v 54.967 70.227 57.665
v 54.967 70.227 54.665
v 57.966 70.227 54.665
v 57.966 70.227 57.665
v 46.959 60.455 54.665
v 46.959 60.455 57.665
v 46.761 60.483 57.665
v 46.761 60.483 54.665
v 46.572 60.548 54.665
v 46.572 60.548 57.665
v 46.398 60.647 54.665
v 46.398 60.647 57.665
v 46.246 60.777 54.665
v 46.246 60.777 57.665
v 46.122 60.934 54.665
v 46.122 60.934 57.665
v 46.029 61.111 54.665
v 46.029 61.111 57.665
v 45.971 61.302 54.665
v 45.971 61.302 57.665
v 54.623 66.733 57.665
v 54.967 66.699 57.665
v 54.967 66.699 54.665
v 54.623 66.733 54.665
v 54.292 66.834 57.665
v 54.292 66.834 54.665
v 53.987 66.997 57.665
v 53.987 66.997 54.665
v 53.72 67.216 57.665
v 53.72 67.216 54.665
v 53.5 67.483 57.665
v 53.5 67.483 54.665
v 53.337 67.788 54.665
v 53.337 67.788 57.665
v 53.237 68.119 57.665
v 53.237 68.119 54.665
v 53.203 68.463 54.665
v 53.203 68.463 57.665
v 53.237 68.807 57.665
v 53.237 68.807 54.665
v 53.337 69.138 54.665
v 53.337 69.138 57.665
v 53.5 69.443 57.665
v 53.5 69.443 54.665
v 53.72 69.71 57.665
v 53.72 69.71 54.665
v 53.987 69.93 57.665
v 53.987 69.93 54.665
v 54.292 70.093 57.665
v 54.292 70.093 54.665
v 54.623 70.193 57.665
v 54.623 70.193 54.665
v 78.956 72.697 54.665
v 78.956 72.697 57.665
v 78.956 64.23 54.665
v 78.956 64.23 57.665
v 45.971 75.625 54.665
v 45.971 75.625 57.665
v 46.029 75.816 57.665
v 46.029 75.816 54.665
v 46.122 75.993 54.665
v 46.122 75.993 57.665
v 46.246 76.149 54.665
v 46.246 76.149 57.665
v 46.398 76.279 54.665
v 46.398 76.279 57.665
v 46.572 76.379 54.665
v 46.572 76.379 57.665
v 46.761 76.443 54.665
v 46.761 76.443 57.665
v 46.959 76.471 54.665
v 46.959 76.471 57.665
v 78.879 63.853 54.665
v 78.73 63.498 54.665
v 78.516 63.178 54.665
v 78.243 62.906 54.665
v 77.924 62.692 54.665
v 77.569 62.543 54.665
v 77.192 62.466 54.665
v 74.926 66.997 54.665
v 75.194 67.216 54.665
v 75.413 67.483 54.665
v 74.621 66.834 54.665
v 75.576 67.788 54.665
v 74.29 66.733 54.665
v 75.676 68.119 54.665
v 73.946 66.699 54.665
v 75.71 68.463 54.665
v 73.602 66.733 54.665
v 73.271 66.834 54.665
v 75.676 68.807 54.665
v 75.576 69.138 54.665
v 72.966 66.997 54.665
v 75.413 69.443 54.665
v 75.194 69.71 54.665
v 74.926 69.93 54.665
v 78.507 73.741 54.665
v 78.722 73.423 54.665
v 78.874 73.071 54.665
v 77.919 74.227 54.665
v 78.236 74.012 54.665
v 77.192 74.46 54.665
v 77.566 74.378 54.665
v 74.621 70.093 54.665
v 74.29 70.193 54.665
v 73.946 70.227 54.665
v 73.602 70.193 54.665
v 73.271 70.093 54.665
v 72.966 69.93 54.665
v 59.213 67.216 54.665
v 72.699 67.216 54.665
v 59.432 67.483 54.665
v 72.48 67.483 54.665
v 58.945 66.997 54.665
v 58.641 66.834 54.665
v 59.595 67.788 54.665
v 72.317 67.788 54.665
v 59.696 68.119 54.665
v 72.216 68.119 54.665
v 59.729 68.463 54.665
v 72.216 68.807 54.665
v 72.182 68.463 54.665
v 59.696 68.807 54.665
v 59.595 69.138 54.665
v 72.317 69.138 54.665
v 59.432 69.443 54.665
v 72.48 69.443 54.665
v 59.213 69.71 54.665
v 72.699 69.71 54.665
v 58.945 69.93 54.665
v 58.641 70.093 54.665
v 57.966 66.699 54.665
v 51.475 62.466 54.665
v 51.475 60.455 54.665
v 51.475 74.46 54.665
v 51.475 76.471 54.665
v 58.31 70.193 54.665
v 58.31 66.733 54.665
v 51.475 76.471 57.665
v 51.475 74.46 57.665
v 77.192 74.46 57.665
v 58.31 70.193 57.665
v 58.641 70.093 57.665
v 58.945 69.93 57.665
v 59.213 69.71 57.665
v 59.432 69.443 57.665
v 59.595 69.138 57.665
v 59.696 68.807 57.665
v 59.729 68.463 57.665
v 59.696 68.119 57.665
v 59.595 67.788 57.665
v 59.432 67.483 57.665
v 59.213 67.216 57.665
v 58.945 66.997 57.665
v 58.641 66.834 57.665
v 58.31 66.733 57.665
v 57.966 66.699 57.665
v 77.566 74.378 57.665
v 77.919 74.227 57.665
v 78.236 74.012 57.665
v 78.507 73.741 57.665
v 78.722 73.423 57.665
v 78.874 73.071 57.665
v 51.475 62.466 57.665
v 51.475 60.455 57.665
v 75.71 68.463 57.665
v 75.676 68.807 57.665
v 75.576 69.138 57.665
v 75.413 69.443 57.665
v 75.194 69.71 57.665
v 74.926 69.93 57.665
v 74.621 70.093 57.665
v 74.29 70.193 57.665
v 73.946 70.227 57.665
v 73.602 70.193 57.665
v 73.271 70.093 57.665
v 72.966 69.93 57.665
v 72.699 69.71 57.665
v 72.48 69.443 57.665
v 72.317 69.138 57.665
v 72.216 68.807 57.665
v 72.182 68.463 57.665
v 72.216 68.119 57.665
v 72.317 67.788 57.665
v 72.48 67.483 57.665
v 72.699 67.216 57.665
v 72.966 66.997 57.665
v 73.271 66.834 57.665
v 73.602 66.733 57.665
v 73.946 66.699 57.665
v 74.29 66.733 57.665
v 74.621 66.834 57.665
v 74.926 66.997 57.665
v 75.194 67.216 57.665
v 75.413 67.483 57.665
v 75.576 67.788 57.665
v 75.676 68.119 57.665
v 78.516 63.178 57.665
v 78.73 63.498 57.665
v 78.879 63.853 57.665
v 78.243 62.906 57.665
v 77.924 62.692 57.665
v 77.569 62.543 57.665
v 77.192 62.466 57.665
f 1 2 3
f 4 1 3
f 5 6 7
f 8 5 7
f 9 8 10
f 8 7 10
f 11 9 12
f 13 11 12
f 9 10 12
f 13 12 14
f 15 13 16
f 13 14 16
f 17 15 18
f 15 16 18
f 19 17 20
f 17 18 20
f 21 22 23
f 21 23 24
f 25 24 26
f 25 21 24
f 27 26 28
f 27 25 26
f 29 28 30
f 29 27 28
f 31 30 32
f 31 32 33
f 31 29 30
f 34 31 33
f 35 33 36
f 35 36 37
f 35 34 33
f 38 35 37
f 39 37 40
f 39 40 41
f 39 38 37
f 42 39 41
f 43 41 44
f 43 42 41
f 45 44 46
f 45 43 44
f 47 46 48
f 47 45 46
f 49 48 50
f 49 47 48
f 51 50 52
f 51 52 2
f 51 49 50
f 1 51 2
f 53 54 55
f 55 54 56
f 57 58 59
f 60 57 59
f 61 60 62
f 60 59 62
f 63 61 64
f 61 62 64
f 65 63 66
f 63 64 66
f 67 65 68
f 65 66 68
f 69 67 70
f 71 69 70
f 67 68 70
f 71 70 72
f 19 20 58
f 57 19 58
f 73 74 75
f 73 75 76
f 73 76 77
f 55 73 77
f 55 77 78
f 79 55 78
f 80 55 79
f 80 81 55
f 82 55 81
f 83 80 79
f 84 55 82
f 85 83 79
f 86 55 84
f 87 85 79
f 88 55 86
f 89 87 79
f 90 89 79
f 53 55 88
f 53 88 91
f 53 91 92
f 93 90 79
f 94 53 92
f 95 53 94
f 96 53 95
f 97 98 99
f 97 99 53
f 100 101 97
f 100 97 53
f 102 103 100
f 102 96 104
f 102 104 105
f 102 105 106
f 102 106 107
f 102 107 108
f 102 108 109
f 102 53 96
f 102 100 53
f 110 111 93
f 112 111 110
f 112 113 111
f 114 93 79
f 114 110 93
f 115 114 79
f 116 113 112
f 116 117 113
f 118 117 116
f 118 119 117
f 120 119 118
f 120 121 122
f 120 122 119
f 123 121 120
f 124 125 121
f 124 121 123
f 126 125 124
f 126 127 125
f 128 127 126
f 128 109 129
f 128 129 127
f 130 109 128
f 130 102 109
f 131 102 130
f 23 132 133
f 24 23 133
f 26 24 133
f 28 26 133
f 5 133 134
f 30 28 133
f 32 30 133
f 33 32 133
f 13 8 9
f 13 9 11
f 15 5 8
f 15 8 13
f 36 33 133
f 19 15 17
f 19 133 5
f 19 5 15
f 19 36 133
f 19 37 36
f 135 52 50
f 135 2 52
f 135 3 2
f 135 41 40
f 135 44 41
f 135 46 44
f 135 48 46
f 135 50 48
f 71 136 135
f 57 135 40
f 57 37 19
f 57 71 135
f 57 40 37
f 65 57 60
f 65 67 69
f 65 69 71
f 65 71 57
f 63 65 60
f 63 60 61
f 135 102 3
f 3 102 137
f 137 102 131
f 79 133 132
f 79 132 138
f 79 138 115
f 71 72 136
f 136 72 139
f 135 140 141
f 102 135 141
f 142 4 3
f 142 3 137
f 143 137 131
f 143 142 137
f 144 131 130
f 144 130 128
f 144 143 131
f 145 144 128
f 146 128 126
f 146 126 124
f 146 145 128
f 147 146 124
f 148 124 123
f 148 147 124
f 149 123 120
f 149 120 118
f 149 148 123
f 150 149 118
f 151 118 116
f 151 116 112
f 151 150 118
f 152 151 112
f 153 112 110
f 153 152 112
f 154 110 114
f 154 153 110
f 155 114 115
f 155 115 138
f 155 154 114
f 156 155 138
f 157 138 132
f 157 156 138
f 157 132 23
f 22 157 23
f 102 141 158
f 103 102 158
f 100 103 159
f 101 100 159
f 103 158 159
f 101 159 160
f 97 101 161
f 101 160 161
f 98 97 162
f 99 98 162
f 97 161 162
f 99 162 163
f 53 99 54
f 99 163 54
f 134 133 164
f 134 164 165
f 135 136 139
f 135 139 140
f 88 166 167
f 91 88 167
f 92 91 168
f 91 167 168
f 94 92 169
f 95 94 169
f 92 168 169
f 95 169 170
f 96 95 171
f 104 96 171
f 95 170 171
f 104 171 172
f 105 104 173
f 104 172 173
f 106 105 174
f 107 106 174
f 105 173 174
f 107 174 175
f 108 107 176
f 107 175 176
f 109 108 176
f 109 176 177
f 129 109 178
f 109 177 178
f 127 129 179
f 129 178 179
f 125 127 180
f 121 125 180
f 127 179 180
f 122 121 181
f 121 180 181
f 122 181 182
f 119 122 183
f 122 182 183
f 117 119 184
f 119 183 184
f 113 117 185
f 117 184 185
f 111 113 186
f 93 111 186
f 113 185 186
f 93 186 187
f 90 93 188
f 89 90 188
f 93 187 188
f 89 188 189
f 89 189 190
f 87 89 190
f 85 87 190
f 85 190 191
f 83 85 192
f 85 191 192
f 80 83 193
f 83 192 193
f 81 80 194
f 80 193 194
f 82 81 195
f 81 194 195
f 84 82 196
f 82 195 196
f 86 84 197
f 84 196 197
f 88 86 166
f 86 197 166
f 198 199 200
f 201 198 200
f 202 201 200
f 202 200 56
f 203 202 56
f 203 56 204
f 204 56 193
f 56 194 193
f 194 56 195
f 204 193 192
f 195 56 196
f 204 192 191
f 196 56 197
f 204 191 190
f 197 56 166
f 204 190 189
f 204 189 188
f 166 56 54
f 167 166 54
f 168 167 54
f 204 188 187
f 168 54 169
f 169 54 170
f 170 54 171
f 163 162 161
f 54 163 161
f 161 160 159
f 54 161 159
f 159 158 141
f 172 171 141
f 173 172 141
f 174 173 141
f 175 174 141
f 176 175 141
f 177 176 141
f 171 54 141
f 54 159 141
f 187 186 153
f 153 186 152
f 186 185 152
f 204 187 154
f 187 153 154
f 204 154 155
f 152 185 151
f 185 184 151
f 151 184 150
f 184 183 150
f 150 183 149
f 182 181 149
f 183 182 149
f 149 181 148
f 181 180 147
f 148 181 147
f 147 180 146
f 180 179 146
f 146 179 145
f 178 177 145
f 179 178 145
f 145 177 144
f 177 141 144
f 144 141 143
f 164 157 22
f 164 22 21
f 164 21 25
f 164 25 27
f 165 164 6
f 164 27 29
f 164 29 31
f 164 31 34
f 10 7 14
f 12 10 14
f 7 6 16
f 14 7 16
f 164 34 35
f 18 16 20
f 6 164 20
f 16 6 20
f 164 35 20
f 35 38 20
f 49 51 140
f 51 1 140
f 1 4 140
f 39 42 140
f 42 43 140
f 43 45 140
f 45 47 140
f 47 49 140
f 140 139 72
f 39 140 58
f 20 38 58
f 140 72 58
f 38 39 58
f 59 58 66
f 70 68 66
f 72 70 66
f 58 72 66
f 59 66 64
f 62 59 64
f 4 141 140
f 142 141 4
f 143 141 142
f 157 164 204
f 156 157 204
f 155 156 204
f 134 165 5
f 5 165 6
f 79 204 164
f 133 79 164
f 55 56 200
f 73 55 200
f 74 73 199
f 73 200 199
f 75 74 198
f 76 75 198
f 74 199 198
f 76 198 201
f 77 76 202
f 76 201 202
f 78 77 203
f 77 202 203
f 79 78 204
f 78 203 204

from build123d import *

# Parameters (mm, degrees)
ROBOTCHASSIS1_START = 54.665073828
ROBOTCHASSIS1_DEPTH = 3.000000026
SKETCH1_R           = 1.763889566
BOSS_EXTRUDE2_DEPTH = 3.000000026


# Read off the part's stored shape, not the designer's step: RobotChassis1
with BuildPart() as part:
    # RobotChassis1 outline → RobotChassis1 (new body)
    with BuildSketch(Plane.XY.offset(ROBOTCHASSIS1_START)):
        Polygon((78.391484289, 73.860644449), (78.215099244, 74.037033219), (78.038699298, 74.142797936), (77.826834588, 74.248562653), (77.615297704, 74.354670097), (77.403775721, 74.424951424), (77.191881209, 74.460434814), (51.474607854, 74.460434814), (51.474607854, 76.471339066), (46.958781152, 76.471339066), (46.782381206, 76.435855676), (46.605996161, 76.400715013), (46.46509078, 76.330094684), (46.323842673, 76.224326242), (46.182937293, 76.118561525), (46.11232069, 75.977313419), (46.006552248, 75.800920923), (45.971072583, 75.624535878), (45.971072583, 61.301893641), (46.006552248, 61.125501145), (46.11232069, 60.9491161), (46.182937293, 60.807867993), (46.323842673, 60.702103276), (46.46509078, 60.59633856), (46.605996161, 60.525714506), (46.782381206, 60.490231116), (46.958781152, 60.455090453), (51.474607854, 60.455090453), (51.474607854, 62.46599098), (77.191881209, 62.46599098), (77.403775721, 62.501131643), (77.826834588, 62.64237975), (78.038699298, 62.78328513), (78.215099244, 62.889392574), (78.391484289, 63.030297954), (78.53238967, 63.206686725), (78.673637776, 63.383075495), (78.779391317, 63.594947655), (78.920654326, 64.018006523), (78.955791264, 64.229882408), (78.955791264, 72.69654711), (78.920654326, 72.908076544), (78.850022822, 73.119948704), (78.779391317, 73.331478138), (78.673637776, 73.507866908), (78.53238967, 73.719396342), align=None)
        Polygon((58.177388578, 70.19161721), (58.388910561, 70.156476547), (58.600447445, 70.085852493), (58.77683249, 70.01522844), (58.953217535, 69.909463723), (59.12960258, 69.768562068), (59.270850687, 69.627310236), (59.412098794, 69.45091774), (59.517867236, 69.274532695), (59.58849874, 69.063003261), (59.658772616, 68.886614491), (59.694252281, 68.67474233), (59.729404121, 68.463212897), (59.694252281, 68.251340736), (59.658772616, 68.039811303), (59.58849874, 67.828281869), (59.517867236, 67.651893098), (59.412098794, 67.475504328), (59.270850687, 67.299111832), (59.12960258, 67.157867451), (58.953217535, 67.016619344), (58.77683249, 66.910854627), (58.600447445, 66.840230574), (58.388910561, 66.769949247), (58.177388578, 66.734465857), (57.965508967, 66.699325193), (54.966903596, 66.699325193), (54.755366712, 66.734465857), (54.543502002, 66.769949247), (54.331965118, 66.840230574), (54.155580072, 66.910854627), (53.979195027, 67.016619344), (53.802795081, 67.157867451), (53.661546974, 67.299111832), (53.520641594, 67.475504328), (53.414873152, 67.651893098), (53.344256549, 67.828281869), (53.273639946, 68.039811303), (53.238488107, 68.251340736), (53.203008442, 68.463212897), (53.238488107, 68.67474233), (53.273639946, 68.886614491), (53.344256549, 69.063003261), (53.414873152, 69.274532695), (53.520641594, 69.45091774), (53.661546974, 69.627310236), (53.802795081, 69.768562068), (53.979195027, 69.909463723), (54.155580072, 70.01522844), (54.331965118, 70.085852493), (54.543502002, 70.156476547), (54.755366712, 70.19161721), (54.966903596, 70.227104325), (57.965508967, 70.227104325), align=None, mode=Mode.SUBTRACT)
        Polygon((74.581555395, 70.085852493), (74.79309228, 70.01522844), (74.969462423, 69.909463723), (75.11071053, 69.768562068), (75.287110477, 69.627310236), (75.49863246, 69.274532695), (75.604400902, 69.063003261), (75.675017505, 68.886614491), (75.710169344, 68.67474233), (75.710169344, 68.251340736), (75.675017505, 68.039811303), (75.604400902, 67.828281869), (75.287110477, 67.299111832), (75.11071053, 67.157867451), (74.969462423, 67.016619344), (74.79309228, 66.910854627), (74.581555395, 66.840230574), (74.369675784, 66.769949247), (74.158153801, 66.734465857), (73.94627419, 66.699325193), (73.769889145, 66.734465857), (73.558352261, 66.769949247), (73.346830278, 66.840230574), (73.134950667, 66.910854627), (72.958565621, 67.016619344), (72.817660241, 67.157867451), (72.641275196, 67.299111832), (72.535164027, 67.475504328), (72.323627143, 67.828281869), (72.25301054, 68.039811303), (72.217873602, 68.251340736), (72.217873602, 68.67474233), (72.25301054, 68.886614491), (72.323627143, 69.063003261), (72.429395585, 69.274532695), (72.535164027, 69.45091774), (72.641275196, 69.627310236), (72.817660241, 69.768562068), (72.958565621, 69.909463723), (73.134950667, 70.01522844), (73.346830278, 70.085852493), (73.558352261, 70.156476547), (73.769889145, 70.19161721), (73.94627419, 70.227104325), (74.158153801, 70.19161721), (74.369675784, 70.156476547), align=None, mode=Mode.SUBTRACT)
    extrude(amount=ROBOTCHASSIS1_DEPTH)


with BuildPart() as body_2:
    # Sketch1 → Boss-Extrude2 (new body)
    with BuildSketch(Plane.XY.offset(57.665073854)):
        with BuildLine():
            Line((51.474607854, 74.460434814), (77.191881209, 74.460434814))
            ThreePointArc((77.191881209, 74.460434814), (78.378212032, 73.882870615), (78.955791264, 72.69654711))
            Line((78.955791264, 72.69654711), (78.955791264, 64.229882408))
            ThreePointArc((78.955791264, 64.229882408), (78.386068245, 63.035701388), (77.191881209, 62.46599098))
            Line((77.191881209, 62.46599098), (51.474607854, 62.46599098))
            Line((51.474607854, 62.46599098), (51.474607854, 60.455090453))
            Line((51.474607854, 60.455090453), (46.958781152, 60.455090453))
            ThreePointArc((46.958781152, 60.455090453), (46.319168008, 60.708479372), (45.971072583, 61.301893641))
            Line((45.971072583, 61.301893641), (45.971072583, 75.624535878))
            ThreePointArc((45.971072583, 75.624535878), (46.319165637, 76.217952912), (46.958781152, 76.471339066))
            Line((46.958781152, 76.471339066), (51.474607854, 76.471339066))
            Line((51.474607854, 76.471339066), (51.474607854, 74.460434814))
        make_face()
        with Locations((73.94627419, 68.463214759)):
            Circle(SKETCH1_R, mode=Mode.SUBTRACT)
        with BuildLine():
            Line((57.965508967, 66.699325193), (54.966903596, 66.699325193))
            ThreePointArc((54.966903596, 66.699325193), (53.20301403, 68.463214759), (54.966903596, 70.227104325))
            Line((54.966903596, 70.227104325), (57.965508967, 70.227104325))
            ThreePointArc((57.965508967, 70.227104325), (59.729398533, 68.463214759), (57.965508967, 66.699325193))
        make_face(mode=Mode.SUBTRACT)
    extrude(amount=-BOSS_EXTRUDE2_DEPTH)


solid = body_2.part
